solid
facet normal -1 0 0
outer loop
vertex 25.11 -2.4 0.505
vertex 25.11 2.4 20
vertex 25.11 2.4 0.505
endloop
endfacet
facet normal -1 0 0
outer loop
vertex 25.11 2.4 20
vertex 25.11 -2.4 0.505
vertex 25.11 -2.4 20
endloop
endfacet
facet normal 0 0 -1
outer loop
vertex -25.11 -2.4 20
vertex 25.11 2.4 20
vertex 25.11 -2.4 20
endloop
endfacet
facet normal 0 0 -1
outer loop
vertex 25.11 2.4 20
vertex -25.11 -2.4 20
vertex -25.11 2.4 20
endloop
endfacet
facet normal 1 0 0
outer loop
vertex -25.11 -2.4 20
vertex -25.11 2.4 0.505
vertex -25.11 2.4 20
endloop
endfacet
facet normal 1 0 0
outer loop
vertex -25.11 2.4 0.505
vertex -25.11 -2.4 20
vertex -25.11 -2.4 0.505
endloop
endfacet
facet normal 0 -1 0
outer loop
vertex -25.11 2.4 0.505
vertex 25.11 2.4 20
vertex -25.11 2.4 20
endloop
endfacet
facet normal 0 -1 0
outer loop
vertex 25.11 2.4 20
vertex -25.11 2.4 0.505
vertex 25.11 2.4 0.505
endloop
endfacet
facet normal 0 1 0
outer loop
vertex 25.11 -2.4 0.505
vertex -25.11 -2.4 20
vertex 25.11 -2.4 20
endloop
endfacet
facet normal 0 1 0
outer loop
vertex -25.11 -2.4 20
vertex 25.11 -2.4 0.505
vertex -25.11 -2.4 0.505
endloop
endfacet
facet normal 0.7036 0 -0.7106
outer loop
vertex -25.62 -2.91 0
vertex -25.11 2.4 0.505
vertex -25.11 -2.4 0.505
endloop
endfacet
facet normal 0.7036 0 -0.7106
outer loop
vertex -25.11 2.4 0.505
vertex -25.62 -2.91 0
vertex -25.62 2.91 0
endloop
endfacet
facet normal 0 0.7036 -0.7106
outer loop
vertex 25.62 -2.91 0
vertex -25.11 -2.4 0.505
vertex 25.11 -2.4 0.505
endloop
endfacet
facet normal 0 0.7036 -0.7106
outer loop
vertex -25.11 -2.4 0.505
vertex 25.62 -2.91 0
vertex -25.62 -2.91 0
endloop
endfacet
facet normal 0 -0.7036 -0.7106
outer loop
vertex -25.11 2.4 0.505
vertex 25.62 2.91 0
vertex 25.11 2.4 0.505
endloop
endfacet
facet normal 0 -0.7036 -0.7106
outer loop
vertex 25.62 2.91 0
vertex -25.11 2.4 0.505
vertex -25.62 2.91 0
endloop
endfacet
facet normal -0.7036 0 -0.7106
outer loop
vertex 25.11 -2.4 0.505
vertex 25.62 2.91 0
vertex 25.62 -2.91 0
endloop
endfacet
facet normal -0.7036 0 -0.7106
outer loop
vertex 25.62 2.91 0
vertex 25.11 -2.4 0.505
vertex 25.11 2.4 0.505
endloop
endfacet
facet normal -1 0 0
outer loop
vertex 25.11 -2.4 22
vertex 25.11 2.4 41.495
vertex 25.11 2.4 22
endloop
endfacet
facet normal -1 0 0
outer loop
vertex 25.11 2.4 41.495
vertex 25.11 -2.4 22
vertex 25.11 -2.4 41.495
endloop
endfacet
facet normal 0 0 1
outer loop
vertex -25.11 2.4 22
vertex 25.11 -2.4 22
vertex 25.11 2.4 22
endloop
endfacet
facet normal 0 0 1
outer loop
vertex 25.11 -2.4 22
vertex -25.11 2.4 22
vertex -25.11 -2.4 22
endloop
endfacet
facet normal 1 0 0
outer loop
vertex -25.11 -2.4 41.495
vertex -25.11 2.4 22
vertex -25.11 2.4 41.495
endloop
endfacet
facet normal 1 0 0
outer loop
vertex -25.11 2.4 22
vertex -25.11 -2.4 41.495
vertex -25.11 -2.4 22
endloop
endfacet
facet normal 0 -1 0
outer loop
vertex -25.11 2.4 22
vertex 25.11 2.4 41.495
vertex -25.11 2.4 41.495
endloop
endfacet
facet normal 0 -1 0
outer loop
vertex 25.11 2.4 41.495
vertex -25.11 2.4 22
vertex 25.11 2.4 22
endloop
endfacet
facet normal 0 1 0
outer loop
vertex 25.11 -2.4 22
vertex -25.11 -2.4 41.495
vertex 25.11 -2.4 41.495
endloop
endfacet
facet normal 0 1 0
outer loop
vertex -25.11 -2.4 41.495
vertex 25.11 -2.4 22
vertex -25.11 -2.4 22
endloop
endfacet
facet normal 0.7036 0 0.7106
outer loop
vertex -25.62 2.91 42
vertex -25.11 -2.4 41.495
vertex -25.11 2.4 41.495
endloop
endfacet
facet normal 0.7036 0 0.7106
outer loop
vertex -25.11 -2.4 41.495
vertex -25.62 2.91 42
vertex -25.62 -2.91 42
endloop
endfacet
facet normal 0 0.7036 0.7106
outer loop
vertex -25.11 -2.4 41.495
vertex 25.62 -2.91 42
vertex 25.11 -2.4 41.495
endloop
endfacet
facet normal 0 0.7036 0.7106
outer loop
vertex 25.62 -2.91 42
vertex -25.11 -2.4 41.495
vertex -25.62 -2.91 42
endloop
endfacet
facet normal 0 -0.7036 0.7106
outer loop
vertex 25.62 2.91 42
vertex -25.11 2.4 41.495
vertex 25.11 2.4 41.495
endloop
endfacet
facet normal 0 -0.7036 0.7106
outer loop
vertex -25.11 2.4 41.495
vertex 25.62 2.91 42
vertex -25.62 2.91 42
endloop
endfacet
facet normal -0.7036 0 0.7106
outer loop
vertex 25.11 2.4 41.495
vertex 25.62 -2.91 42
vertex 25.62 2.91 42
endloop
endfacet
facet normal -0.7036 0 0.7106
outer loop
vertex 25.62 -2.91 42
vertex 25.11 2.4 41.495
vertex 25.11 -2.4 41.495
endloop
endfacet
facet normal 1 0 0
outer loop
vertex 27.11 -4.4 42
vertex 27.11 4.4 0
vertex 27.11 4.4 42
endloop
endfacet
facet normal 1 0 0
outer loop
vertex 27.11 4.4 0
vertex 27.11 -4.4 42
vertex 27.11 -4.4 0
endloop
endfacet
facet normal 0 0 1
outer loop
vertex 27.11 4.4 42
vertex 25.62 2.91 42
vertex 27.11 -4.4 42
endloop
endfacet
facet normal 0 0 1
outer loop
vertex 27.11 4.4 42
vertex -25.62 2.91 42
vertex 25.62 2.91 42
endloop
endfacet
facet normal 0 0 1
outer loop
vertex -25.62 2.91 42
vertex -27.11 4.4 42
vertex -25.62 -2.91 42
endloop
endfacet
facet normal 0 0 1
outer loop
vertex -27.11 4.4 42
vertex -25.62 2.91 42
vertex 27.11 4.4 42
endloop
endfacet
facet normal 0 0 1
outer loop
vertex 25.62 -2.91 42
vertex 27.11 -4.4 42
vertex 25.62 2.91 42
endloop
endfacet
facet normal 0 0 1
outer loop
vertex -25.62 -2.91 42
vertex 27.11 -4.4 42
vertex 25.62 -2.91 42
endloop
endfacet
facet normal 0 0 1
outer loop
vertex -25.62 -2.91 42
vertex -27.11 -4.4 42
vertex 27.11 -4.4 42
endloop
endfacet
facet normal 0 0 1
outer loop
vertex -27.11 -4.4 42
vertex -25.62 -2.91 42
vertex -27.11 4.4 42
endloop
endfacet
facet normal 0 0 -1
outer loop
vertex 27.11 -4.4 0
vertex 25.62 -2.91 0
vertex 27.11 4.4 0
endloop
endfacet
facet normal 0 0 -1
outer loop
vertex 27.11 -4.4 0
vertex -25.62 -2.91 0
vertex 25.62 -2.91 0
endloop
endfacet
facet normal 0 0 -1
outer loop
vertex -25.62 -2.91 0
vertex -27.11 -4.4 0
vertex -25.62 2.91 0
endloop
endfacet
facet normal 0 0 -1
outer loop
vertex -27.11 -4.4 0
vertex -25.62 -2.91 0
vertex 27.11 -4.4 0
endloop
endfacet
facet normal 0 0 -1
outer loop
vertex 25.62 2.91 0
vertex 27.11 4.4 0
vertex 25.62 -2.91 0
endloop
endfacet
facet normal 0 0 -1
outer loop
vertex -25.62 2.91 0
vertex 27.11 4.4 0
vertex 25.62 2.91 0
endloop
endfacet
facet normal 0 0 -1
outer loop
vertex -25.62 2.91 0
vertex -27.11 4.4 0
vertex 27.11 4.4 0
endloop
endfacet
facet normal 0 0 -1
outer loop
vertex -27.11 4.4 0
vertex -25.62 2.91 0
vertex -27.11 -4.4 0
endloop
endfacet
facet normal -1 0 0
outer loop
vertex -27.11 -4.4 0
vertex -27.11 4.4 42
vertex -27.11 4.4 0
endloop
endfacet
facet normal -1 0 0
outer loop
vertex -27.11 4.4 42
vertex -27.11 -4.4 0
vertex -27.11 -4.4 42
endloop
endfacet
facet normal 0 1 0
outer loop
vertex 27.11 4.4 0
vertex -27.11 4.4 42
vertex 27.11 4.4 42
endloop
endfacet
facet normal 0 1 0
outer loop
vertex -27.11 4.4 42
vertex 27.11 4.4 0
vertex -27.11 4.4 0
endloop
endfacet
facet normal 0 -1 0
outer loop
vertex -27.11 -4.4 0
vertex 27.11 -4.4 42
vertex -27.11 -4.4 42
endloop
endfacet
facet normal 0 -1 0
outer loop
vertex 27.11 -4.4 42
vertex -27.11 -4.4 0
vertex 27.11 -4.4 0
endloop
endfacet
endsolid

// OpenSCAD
// Plank connector: an original CanFactory design, published under CC BY 4.0.
//
// A symmetric sleeve that joins two planks end to end. Each plank end slides
// into its own rectangular pocket, one from each end of the sleeve, and butts
// against a solid stop in the middle. Optional screw holes cross the sleeve
// through its wide faces (and through the planks), sized as clearance holes
// per DIN EN 20273 (ISO 273).
//
// The part is modelled standing up, as it prints: Z is the insertion axis,
// X the wide side of the pocket, Y its thin side. Nothing scales implicitly:
// every size below is exactly the millimetres given.

// ---------------------------------------------------------------

// Pocket cross-section: the wide side (plank width plus clearance)
POCKET_WIDTH     = 50.22; //[5:0.01:200]
// Pocket cross-section: the thin side (plank thickness plus clearance)
POCKET_THICKNESS =  4.80; //[1:0.01:50]
// How far each plank end goes into the connector
INSERTION_DEPTH  = 20.0;  //[5:0.5:150]
// Material around the pockets, on every side
WALL_THICKNESS   =  2.0;  //[0.8:0.1:10]
// Solid stop between the two pockets; 0 makes one open sleeve
STOP_THICKNESS   =  2.0;  //[0:0.1:20]
// 45 degree lead-in at each pocket mouth; 0 for none
ENTRY_CHAMFER    =  0.5;  //[0:0.1:5]

// Screw size of the through-holes, or "none"
SCREW_SIZE       = "none"; //[none,M2,M2.5,M3,M4,M5,M6,M8]
// DIN EN 20273 series: fine (H12), medium (H13) or coarse (H14)
HOLE_FIT         = "medium"; //[fine,medium,coarse]
// Holes per plank end, spread evenly across the wide side
HOLES_PER_END    = 2; //[1:4]

ROUNDNESS        = 48; //[24,48,96]

// ---------------------------------------------------------------

// DIN EN 20273 (ISO 273) clearance holes: [screw, fine, medium, coarse], in mm.
// Mirrored by CLEARANCE_HOLES in packages/contracts/src/models.ts (a test
// compares the two).
DIN_EN_20273 = [
    ["M2",   2.2,  2.4,  2.6],
    ["M2.5", 2.7,  2.9,  3.1],
    ["M3",   3.2,  3.4,  3.6],
    ["M4",   4.3,  4.5,  4.8],
    ["M5",   5.3,  5.5,  5.8],
    ["M6",   6.4,  6.6,  7.0],
    ["M8",   8.4,  9.0, 10.0],
];

FIT_COLUMN = HOLE_FIT == "fine" ? 1 : HOLE_FIT == "coarse" ? 3 : 2;

function hole_diameter(screw) =
    let (row = [for (r = DIN_EN_20273) if (r[0] == screw) r])
    len(row) == 0 ? 0 : row[0][FIT_COLUMN];

HOLE_DIAMETER = hole_diameter(SCREW_SIZE);

OUTER_WIDTH     = POCKET_WIDTH + 2*WALL_THICKNESS;
OUTER_THICKNESS = POCKET_THICKNESS + 2*WALL_THICKNESS;
OUTER_HEIGHT    = 2*INSERTION_DEPTH + STOP_THICKNESS;

// Keeps cutters from sharing a face with the part they cut.
EPS = 0.01;

// ---------------------------------------------------------------

// One pocket, opening at z = 0 and reaching `depth` up into the part, with
// its lead-in chamfer at the mouth.
module pocket(depth)
{
    translate([-POCKET_WIDTH/2, -POCKET_THICKNESS/2, -EPS])
        cube([POCKET_WIDTH, POCKET_THICKNESS, depth+EPS]);
    if (ENTRY_CHAMFER > 0) hull() {
        translate([0, 0, -EPS/2])
            cube([POCKET_WIDTH+2*ENTRY_CHAMFER+2*EPS, POCKET_THICKNESS+2*ENTRY_CHAMFER+2*EPS, EPS], center=true);
        translate([0, 0, ENTRY_CHAMFER])
            cube([POCKET_WIDTH, POCKET_THICKNESS, EPS], center=true);
    }
}

// The screw holes of one plank end, centred at height z: straight through
// both wide walls, spread evenly across the pocket width.
module holes(z)
{
    if (HOLE_DIAMETER > 0) for (i = [0:HOLES_PER_END-1]) {
        x = -POCKET_WIDTH/2 + (i+0.5)*POCKET_WIDTH/HOLES_PER_END;
        translate([x, 0, z]) rotate([90, 0, 0])
            cylinder(d=HOLE_DIAMETER, h=OUTER_THICKNESS+2, center=true, $fn=ROUNDNESS);
    }
}

module plank_connector()
{
    // Without a stop the two pockets meet; let them overlap so that they
    // form one clean through-opening.
    reach = INSERTION_DEPTH + (STOP_THICKNESS > 0 ? 0 : EPS);
    difference() {
        translate([-OUTER_WIDTH/2, -OUTER_THICKNESS/2, 0])
            cube([OUTER_WIDTH, OUTER_THICKNESS, OUTER_HEIGHT]);
        // lower pocket, open at the bottom
        pocket(reach);
        // upper pocket, open at the top
        translate([0, 0, OUTER_HEIGHT]) mirror([0, 0, 1]) pocket(reach);
        holes(INSERTION_DEPTH/2);
        holes(OUTER_HEIGHT - INSERTION_DEPTH/2);
    }
}

plank_connector();

// vim: set et sw=4 ts=4:
